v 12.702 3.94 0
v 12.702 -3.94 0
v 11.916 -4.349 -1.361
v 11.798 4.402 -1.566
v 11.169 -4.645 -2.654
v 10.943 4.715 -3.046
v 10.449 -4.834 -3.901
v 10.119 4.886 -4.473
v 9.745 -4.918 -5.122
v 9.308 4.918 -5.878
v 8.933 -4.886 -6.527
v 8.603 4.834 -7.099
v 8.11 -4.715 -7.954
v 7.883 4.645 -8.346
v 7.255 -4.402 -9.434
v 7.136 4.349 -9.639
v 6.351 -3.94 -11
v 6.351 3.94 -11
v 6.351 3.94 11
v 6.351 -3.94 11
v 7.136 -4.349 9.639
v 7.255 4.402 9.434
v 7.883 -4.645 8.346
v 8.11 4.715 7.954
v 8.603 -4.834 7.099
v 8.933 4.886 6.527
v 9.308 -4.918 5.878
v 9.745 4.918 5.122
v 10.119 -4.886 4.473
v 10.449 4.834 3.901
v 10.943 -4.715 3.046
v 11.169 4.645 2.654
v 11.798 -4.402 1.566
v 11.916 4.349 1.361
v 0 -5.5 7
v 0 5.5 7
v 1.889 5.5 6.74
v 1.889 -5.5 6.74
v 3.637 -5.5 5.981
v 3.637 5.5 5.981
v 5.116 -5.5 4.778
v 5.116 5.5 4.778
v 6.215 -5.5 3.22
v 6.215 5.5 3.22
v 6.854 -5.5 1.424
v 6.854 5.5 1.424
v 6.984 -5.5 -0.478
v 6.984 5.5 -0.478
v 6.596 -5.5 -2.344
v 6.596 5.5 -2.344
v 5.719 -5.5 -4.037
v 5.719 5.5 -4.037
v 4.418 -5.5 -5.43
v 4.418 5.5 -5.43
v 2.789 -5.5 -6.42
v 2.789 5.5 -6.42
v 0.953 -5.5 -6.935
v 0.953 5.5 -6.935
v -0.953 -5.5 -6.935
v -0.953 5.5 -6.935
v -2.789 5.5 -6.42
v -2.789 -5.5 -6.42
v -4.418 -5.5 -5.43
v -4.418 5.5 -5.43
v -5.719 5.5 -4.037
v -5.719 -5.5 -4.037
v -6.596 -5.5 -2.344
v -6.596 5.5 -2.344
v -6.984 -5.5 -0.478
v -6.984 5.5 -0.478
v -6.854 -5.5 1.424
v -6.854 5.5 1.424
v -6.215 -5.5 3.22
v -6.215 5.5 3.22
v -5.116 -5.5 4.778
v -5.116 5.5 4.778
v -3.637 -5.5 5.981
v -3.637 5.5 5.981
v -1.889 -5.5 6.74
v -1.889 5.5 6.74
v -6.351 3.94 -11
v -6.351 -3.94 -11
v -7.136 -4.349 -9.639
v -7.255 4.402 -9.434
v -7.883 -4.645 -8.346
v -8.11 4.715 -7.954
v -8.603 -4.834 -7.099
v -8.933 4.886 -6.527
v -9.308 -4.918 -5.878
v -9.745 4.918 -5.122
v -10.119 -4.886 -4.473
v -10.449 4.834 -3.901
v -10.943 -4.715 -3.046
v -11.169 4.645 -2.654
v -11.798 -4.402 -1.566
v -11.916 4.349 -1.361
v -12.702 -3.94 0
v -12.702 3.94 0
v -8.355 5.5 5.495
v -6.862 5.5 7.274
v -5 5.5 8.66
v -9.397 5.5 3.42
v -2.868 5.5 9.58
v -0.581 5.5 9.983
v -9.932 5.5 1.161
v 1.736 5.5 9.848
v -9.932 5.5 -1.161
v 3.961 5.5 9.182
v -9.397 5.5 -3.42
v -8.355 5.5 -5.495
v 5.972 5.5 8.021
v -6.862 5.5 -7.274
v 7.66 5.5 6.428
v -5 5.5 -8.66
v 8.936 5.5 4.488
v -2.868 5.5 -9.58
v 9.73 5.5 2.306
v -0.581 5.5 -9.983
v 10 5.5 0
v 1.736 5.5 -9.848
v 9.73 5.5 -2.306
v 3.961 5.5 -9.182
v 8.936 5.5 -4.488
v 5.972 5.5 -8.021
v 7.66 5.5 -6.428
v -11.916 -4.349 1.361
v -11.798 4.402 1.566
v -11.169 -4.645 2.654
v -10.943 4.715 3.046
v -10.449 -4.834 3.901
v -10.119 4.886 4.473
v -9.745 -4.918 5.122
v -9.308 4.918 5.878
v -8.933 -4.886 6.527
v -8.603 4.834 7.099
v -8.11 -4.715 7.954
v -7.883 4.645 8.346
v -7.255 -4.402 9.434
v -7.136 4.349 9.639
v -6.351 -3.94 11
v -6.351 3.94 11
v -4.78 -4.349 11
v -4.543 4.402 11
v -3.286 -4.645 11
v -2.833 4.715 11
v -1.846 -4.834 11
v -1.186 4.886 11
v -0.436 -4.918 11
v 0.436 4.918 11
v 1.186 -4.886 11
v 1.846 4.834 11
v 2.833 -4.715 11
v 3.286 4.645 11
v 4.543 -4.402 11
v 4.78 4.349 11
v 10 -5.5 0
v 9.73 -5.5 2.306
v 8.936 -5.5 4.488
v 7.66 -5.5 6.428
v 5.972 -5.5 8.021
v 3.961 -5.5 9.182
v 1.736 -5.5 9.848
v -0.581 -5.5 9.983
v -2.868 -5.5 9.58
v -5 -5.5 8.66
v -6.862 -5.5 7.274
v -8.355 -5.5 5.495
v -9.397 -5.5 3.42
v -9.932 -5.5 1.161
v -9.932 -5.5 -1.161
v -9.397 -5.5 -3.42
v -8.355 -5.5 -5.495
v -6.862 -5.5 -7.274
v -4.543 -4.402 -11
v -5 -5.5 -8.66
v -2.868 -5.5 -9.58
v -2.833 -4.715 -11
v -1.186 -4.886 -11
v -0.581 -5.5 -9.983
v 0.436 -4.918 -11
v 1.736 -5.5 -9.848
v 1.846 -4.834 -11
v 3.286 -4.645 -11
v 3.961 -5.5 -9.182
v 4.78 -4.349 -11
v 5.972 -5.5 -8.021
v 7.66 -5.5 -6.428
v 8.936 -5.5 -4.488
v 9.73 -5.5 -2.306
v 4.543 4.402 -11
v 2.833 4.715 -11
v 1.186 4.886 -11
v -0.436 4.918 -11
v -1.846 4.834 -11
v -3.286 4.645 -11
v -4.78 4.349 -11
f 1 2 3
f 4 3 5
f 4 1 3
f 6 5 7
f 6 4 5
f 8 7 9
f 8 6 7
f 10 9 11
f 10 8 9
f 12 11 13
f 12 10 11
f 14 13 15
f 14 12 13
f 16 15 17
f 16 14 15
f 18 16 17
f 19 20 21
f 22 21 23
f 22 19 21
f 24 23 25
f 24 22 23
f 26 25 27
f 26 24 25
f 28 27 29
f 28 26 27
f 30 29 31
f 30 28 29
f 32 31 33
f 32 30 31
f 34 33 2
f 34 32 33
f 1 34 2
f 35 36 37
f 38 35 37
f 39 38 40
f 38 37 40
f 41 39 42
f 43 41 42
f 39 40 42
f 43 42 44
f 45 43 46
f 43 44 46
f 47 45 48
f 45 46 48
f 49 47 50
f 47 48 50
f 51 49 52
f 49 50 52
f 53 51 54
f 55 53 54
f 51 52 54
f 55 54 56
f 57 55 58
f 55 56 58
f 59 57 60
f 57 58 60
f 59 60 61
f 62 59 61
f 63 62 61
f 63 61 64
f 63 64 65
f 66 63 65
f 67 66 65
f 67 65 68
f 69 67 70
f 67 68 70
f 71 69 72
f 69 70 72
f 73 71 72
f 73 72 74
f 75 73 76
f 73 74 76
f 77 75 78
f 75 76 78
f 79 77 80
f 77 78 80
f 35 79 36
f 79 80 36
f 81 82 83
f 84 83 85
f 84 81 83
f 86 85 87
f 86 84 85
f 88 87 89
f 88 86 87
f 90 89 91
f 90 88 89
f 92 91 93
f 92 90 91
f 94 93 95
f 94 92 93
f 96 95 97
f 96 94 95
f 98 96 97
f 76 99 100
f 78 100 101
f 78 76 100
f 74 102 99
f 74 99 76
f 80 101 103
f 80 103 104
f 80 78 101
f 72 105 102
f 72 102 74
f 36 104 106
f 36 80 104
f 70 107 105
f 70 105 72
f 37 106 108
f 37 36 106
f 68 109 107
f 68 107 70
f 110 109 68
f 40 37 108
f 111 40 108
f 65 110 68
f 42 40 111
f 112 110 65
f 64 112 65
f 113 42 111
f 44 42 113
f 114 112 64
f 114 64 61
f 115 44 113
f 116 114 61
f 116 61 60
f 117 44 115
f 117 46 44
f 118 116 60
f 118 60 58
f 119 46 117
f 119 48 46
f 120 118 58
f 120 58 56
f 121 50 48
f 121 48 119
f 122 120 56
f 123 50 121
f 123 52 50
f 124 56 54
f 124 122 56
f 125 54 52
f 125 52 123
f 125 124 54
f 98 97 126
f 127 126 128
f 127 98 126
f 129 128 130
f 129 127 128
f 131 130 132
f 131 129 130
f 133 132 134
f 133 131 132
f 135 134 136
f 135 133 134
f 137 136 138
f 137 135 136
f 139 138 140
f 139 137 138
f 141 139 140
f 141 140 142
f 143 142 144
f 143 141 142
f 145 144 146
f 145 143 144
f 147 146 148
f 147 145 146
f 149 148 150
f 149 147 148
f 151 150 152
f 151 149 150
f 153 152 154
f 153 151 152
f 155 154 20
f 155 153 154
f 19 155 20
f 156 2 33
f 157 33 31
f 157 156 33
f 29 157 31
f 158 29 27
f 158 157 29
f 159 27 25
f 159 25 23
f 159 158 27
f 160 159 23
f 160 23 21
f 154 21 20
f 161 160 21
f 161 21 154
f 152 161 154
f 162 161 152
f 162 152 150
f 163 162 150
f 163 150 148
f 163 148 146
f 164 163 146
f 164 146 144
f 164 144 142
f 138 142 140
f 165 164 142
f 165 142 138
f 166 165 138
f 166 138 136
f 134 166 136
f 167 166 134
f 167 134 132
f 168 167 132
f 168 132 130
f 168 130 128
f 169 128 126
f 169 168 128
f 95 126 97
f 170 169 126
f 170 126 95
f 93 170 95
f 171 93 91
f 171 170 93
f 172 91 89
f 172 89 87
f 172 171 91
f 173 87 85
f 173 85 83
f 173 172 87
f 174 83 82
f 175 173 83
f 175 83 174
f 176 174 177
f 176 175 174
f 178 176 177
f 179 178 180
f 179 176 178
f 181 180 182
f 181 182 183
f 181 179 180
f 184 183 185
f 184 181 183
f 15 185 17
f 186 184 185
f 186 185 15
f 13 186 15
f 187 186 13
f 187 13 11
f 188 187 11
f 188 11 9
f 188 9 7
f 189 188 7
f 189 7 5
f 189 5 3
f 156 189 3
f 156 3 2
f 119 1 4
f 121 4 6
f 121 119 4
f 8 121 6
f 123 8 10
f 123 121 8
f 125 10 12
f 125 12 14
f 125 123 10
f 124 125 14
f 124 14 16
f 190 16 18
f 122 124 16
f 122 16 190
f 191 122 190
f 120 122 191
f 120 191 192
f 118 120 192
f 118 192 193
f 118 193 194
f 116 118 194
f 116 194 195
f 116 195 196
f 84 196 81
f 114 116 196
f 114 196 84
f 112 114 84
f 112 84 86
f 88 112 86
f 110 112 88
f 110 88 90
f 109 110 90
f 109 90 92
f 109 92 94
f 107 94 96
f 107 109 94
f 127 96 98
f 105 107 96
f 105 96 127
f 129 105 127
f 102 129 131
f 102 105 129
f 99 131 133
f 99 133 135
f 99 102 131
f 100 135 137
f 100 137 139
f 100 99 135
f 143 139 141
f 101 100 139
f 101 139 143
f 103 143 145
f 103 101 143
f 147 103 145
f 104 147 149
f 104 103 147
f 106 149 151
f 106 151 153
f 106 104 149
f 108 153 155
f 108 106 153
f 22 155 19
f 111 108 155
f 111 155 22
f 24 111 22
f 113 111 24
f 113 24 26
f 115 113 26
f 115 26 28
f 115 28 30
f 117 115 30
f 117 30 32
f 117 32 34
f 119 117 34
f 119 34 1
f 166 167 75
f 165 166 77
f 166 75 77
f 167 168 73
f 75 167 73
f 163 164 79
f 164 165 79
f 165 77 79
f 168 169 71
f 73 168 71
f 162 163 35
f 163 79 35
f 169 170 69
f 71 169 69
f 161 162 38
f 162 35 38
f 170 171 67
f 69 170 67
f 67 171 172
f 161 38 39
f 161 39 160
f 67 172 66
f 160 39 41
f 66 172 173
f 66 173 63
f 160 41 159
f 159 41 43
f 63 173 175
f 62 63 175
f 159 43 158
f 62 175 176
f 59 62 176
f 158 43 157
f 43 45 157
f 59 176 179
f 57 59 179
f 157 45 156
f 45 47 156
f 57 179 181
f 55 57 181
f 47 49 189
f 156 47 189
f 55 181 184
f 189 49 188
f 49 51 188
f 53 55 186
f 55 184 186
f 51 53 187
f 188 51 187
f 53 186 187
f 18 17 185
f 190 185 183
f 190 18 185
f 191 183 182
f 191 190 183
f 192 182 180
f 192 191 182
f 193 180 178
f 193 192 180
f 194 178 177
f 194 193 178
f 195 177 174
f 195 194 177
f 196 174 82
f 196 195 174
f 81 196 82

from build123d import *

# Parameters (mm, degrees)
SALIENTE_EXTRUIR6_DEPTH = 5.5
CROQUIS6_R              = 7
CORTAR_EXTRUIR1_DEPTH   = 11
CROQUIS10_OUTSIDE_W     = 69.118
CROQUIS10_OUTSIDE_H     = 65.714
CROQUIS10_OUTSIDE_R     = 10
CORTAR_EXTRUIR2_DEPTH   = 10
CORTAR_EXTRUIR2_DRAFT   = -60
CROQUIS11_OUTSIDE_W     = 69.118
CROQUIS11_OUTSIDE_H     = 65.714
CROQUIS11_OUTSIDE_R     = 10
CORTAR_EXTRUIR3_DEPTH   = 10
CORTAR_EXTRUIR3_DRAFT   = -60


with BuildPart() as part:
    # Croquis5 → Saliente-Extruir6 (new, symmetric)
    with BuildSketch(Plane(origin=(0, 0, 0), x_dir=(1, 0, 0), z_dir=(0, 1, 0))):
        Polygon((12.701705922, 0), (6.350852961, 11), (-6.350852961, 11), (-12.701705922, 0), (-6.350852961, -11), (6.350852961, -11), align=None)
    extrude(amount=SALIENTE_EXTRUIR6_DEPTH, both=True)

    # Croquis6 → Cortar-Extruir1 (cut)
    with BuildSketch(Plane(origin=(0, 5.5, 0), x_dir=(1, 0, 0), z_dir=(0, 1, 0))):
        with Locations(Location((0, 0, 0), (0, 0, 270))):
            Circle(CROQUIS6_R)
    extrude(amount=-CORTAR_EXTRUIR1_DEPTH, mode=Mode.SUBTRACT)


with BuildPart() as cortar_extruir2_tool:
    # Croquis10 outside → Cortar-Extruir2 (with draft: the straight prism first)
    with BuildSketch(Plane(origin=(0, 5.5, 0), x_dir=(1, 0, 0), z_dir=(0, 1, 0))):
        Rectangle(CROQUIS10_OUTSIDE_W, CROQUIS10_OUTSIDE_H)
        Circle(CROQUIS10_OUTSIDE_R, mode=Mode.SUBTRACT)
    extrude(amount=-CORTAR_EXTRUIR2_DEPTH)
    # Cortar-Extruir2: the draft: its side faces are tilted about the plane it starts from
    cortar_extruir2_sides = [cortar_extruir2_tool.faces().sort_by_distance(p)[0] for p in [
        (0, 0.5, 32.857),
        (34.559, 0.5, 0),
        (0, 0.5, -32.857),
        (-34.559, 0.5, 0),
        (-10, 0.5, 0),
    ]]
    draft(cortar_extruir2_sides, Plane(origin=(0, 5.5, 0), x_dir=(1, 0, 0), z_dir=(0, 1, 0)), CORTAR_EXTRUIR2_DRAFT)


with BuildPart() as part_1:
    add(part.part)

    # Cortar-Extruir2: cut by cortar_extruir2_tool
    add(cortar_extruir2_tool.part, mode=Mode.SUBTRACT)


with BuildPart() as cortar_extruir3_tool:
    # Croquis11 outside → Cortar-Extruir3 (with draft: the straight prism first)
    with BuildSketch(Plane.XZ.offset(5.5)):
        Rectangle(CROQUIS11_OUTSIDE_W, CROQUIS11_OUTSIDE_H)
        Circle(CROQUIS11_OUTSIDE_R, mode=Mode.SUBTRACT)
    extrude(amount=-CORTAR_EXTRUIR3_DEPTH)
    # Cortar-Extruir3: the draft: its side faces are tilted about the plane it starts from
    cortar_extruir3_sides = [cortar_extruir3_tool.faces().sort_by_distance(p)[0] for p in [
        (0, -0.5, -32.857),
        (34.559, -0.5, 0),
        (0, -0.5, 32.857),
        (-34.559, -0.5, 0),
        (-10, -0.5, 0),
    ]]
    draft(cortar_extruir3_sides, Plane.XZ.offset(5.5), CORTAR_EXTRUIR3_DRAFT)


with BuildPart() as part_2:
    add(part_1.part)

    # Cortar-Extruir3: cut by cortar_extruir3_tool
    add(cortar_extruir3_tool.part, mode=Mode.SUBTRACT)


solid = part_2.part
